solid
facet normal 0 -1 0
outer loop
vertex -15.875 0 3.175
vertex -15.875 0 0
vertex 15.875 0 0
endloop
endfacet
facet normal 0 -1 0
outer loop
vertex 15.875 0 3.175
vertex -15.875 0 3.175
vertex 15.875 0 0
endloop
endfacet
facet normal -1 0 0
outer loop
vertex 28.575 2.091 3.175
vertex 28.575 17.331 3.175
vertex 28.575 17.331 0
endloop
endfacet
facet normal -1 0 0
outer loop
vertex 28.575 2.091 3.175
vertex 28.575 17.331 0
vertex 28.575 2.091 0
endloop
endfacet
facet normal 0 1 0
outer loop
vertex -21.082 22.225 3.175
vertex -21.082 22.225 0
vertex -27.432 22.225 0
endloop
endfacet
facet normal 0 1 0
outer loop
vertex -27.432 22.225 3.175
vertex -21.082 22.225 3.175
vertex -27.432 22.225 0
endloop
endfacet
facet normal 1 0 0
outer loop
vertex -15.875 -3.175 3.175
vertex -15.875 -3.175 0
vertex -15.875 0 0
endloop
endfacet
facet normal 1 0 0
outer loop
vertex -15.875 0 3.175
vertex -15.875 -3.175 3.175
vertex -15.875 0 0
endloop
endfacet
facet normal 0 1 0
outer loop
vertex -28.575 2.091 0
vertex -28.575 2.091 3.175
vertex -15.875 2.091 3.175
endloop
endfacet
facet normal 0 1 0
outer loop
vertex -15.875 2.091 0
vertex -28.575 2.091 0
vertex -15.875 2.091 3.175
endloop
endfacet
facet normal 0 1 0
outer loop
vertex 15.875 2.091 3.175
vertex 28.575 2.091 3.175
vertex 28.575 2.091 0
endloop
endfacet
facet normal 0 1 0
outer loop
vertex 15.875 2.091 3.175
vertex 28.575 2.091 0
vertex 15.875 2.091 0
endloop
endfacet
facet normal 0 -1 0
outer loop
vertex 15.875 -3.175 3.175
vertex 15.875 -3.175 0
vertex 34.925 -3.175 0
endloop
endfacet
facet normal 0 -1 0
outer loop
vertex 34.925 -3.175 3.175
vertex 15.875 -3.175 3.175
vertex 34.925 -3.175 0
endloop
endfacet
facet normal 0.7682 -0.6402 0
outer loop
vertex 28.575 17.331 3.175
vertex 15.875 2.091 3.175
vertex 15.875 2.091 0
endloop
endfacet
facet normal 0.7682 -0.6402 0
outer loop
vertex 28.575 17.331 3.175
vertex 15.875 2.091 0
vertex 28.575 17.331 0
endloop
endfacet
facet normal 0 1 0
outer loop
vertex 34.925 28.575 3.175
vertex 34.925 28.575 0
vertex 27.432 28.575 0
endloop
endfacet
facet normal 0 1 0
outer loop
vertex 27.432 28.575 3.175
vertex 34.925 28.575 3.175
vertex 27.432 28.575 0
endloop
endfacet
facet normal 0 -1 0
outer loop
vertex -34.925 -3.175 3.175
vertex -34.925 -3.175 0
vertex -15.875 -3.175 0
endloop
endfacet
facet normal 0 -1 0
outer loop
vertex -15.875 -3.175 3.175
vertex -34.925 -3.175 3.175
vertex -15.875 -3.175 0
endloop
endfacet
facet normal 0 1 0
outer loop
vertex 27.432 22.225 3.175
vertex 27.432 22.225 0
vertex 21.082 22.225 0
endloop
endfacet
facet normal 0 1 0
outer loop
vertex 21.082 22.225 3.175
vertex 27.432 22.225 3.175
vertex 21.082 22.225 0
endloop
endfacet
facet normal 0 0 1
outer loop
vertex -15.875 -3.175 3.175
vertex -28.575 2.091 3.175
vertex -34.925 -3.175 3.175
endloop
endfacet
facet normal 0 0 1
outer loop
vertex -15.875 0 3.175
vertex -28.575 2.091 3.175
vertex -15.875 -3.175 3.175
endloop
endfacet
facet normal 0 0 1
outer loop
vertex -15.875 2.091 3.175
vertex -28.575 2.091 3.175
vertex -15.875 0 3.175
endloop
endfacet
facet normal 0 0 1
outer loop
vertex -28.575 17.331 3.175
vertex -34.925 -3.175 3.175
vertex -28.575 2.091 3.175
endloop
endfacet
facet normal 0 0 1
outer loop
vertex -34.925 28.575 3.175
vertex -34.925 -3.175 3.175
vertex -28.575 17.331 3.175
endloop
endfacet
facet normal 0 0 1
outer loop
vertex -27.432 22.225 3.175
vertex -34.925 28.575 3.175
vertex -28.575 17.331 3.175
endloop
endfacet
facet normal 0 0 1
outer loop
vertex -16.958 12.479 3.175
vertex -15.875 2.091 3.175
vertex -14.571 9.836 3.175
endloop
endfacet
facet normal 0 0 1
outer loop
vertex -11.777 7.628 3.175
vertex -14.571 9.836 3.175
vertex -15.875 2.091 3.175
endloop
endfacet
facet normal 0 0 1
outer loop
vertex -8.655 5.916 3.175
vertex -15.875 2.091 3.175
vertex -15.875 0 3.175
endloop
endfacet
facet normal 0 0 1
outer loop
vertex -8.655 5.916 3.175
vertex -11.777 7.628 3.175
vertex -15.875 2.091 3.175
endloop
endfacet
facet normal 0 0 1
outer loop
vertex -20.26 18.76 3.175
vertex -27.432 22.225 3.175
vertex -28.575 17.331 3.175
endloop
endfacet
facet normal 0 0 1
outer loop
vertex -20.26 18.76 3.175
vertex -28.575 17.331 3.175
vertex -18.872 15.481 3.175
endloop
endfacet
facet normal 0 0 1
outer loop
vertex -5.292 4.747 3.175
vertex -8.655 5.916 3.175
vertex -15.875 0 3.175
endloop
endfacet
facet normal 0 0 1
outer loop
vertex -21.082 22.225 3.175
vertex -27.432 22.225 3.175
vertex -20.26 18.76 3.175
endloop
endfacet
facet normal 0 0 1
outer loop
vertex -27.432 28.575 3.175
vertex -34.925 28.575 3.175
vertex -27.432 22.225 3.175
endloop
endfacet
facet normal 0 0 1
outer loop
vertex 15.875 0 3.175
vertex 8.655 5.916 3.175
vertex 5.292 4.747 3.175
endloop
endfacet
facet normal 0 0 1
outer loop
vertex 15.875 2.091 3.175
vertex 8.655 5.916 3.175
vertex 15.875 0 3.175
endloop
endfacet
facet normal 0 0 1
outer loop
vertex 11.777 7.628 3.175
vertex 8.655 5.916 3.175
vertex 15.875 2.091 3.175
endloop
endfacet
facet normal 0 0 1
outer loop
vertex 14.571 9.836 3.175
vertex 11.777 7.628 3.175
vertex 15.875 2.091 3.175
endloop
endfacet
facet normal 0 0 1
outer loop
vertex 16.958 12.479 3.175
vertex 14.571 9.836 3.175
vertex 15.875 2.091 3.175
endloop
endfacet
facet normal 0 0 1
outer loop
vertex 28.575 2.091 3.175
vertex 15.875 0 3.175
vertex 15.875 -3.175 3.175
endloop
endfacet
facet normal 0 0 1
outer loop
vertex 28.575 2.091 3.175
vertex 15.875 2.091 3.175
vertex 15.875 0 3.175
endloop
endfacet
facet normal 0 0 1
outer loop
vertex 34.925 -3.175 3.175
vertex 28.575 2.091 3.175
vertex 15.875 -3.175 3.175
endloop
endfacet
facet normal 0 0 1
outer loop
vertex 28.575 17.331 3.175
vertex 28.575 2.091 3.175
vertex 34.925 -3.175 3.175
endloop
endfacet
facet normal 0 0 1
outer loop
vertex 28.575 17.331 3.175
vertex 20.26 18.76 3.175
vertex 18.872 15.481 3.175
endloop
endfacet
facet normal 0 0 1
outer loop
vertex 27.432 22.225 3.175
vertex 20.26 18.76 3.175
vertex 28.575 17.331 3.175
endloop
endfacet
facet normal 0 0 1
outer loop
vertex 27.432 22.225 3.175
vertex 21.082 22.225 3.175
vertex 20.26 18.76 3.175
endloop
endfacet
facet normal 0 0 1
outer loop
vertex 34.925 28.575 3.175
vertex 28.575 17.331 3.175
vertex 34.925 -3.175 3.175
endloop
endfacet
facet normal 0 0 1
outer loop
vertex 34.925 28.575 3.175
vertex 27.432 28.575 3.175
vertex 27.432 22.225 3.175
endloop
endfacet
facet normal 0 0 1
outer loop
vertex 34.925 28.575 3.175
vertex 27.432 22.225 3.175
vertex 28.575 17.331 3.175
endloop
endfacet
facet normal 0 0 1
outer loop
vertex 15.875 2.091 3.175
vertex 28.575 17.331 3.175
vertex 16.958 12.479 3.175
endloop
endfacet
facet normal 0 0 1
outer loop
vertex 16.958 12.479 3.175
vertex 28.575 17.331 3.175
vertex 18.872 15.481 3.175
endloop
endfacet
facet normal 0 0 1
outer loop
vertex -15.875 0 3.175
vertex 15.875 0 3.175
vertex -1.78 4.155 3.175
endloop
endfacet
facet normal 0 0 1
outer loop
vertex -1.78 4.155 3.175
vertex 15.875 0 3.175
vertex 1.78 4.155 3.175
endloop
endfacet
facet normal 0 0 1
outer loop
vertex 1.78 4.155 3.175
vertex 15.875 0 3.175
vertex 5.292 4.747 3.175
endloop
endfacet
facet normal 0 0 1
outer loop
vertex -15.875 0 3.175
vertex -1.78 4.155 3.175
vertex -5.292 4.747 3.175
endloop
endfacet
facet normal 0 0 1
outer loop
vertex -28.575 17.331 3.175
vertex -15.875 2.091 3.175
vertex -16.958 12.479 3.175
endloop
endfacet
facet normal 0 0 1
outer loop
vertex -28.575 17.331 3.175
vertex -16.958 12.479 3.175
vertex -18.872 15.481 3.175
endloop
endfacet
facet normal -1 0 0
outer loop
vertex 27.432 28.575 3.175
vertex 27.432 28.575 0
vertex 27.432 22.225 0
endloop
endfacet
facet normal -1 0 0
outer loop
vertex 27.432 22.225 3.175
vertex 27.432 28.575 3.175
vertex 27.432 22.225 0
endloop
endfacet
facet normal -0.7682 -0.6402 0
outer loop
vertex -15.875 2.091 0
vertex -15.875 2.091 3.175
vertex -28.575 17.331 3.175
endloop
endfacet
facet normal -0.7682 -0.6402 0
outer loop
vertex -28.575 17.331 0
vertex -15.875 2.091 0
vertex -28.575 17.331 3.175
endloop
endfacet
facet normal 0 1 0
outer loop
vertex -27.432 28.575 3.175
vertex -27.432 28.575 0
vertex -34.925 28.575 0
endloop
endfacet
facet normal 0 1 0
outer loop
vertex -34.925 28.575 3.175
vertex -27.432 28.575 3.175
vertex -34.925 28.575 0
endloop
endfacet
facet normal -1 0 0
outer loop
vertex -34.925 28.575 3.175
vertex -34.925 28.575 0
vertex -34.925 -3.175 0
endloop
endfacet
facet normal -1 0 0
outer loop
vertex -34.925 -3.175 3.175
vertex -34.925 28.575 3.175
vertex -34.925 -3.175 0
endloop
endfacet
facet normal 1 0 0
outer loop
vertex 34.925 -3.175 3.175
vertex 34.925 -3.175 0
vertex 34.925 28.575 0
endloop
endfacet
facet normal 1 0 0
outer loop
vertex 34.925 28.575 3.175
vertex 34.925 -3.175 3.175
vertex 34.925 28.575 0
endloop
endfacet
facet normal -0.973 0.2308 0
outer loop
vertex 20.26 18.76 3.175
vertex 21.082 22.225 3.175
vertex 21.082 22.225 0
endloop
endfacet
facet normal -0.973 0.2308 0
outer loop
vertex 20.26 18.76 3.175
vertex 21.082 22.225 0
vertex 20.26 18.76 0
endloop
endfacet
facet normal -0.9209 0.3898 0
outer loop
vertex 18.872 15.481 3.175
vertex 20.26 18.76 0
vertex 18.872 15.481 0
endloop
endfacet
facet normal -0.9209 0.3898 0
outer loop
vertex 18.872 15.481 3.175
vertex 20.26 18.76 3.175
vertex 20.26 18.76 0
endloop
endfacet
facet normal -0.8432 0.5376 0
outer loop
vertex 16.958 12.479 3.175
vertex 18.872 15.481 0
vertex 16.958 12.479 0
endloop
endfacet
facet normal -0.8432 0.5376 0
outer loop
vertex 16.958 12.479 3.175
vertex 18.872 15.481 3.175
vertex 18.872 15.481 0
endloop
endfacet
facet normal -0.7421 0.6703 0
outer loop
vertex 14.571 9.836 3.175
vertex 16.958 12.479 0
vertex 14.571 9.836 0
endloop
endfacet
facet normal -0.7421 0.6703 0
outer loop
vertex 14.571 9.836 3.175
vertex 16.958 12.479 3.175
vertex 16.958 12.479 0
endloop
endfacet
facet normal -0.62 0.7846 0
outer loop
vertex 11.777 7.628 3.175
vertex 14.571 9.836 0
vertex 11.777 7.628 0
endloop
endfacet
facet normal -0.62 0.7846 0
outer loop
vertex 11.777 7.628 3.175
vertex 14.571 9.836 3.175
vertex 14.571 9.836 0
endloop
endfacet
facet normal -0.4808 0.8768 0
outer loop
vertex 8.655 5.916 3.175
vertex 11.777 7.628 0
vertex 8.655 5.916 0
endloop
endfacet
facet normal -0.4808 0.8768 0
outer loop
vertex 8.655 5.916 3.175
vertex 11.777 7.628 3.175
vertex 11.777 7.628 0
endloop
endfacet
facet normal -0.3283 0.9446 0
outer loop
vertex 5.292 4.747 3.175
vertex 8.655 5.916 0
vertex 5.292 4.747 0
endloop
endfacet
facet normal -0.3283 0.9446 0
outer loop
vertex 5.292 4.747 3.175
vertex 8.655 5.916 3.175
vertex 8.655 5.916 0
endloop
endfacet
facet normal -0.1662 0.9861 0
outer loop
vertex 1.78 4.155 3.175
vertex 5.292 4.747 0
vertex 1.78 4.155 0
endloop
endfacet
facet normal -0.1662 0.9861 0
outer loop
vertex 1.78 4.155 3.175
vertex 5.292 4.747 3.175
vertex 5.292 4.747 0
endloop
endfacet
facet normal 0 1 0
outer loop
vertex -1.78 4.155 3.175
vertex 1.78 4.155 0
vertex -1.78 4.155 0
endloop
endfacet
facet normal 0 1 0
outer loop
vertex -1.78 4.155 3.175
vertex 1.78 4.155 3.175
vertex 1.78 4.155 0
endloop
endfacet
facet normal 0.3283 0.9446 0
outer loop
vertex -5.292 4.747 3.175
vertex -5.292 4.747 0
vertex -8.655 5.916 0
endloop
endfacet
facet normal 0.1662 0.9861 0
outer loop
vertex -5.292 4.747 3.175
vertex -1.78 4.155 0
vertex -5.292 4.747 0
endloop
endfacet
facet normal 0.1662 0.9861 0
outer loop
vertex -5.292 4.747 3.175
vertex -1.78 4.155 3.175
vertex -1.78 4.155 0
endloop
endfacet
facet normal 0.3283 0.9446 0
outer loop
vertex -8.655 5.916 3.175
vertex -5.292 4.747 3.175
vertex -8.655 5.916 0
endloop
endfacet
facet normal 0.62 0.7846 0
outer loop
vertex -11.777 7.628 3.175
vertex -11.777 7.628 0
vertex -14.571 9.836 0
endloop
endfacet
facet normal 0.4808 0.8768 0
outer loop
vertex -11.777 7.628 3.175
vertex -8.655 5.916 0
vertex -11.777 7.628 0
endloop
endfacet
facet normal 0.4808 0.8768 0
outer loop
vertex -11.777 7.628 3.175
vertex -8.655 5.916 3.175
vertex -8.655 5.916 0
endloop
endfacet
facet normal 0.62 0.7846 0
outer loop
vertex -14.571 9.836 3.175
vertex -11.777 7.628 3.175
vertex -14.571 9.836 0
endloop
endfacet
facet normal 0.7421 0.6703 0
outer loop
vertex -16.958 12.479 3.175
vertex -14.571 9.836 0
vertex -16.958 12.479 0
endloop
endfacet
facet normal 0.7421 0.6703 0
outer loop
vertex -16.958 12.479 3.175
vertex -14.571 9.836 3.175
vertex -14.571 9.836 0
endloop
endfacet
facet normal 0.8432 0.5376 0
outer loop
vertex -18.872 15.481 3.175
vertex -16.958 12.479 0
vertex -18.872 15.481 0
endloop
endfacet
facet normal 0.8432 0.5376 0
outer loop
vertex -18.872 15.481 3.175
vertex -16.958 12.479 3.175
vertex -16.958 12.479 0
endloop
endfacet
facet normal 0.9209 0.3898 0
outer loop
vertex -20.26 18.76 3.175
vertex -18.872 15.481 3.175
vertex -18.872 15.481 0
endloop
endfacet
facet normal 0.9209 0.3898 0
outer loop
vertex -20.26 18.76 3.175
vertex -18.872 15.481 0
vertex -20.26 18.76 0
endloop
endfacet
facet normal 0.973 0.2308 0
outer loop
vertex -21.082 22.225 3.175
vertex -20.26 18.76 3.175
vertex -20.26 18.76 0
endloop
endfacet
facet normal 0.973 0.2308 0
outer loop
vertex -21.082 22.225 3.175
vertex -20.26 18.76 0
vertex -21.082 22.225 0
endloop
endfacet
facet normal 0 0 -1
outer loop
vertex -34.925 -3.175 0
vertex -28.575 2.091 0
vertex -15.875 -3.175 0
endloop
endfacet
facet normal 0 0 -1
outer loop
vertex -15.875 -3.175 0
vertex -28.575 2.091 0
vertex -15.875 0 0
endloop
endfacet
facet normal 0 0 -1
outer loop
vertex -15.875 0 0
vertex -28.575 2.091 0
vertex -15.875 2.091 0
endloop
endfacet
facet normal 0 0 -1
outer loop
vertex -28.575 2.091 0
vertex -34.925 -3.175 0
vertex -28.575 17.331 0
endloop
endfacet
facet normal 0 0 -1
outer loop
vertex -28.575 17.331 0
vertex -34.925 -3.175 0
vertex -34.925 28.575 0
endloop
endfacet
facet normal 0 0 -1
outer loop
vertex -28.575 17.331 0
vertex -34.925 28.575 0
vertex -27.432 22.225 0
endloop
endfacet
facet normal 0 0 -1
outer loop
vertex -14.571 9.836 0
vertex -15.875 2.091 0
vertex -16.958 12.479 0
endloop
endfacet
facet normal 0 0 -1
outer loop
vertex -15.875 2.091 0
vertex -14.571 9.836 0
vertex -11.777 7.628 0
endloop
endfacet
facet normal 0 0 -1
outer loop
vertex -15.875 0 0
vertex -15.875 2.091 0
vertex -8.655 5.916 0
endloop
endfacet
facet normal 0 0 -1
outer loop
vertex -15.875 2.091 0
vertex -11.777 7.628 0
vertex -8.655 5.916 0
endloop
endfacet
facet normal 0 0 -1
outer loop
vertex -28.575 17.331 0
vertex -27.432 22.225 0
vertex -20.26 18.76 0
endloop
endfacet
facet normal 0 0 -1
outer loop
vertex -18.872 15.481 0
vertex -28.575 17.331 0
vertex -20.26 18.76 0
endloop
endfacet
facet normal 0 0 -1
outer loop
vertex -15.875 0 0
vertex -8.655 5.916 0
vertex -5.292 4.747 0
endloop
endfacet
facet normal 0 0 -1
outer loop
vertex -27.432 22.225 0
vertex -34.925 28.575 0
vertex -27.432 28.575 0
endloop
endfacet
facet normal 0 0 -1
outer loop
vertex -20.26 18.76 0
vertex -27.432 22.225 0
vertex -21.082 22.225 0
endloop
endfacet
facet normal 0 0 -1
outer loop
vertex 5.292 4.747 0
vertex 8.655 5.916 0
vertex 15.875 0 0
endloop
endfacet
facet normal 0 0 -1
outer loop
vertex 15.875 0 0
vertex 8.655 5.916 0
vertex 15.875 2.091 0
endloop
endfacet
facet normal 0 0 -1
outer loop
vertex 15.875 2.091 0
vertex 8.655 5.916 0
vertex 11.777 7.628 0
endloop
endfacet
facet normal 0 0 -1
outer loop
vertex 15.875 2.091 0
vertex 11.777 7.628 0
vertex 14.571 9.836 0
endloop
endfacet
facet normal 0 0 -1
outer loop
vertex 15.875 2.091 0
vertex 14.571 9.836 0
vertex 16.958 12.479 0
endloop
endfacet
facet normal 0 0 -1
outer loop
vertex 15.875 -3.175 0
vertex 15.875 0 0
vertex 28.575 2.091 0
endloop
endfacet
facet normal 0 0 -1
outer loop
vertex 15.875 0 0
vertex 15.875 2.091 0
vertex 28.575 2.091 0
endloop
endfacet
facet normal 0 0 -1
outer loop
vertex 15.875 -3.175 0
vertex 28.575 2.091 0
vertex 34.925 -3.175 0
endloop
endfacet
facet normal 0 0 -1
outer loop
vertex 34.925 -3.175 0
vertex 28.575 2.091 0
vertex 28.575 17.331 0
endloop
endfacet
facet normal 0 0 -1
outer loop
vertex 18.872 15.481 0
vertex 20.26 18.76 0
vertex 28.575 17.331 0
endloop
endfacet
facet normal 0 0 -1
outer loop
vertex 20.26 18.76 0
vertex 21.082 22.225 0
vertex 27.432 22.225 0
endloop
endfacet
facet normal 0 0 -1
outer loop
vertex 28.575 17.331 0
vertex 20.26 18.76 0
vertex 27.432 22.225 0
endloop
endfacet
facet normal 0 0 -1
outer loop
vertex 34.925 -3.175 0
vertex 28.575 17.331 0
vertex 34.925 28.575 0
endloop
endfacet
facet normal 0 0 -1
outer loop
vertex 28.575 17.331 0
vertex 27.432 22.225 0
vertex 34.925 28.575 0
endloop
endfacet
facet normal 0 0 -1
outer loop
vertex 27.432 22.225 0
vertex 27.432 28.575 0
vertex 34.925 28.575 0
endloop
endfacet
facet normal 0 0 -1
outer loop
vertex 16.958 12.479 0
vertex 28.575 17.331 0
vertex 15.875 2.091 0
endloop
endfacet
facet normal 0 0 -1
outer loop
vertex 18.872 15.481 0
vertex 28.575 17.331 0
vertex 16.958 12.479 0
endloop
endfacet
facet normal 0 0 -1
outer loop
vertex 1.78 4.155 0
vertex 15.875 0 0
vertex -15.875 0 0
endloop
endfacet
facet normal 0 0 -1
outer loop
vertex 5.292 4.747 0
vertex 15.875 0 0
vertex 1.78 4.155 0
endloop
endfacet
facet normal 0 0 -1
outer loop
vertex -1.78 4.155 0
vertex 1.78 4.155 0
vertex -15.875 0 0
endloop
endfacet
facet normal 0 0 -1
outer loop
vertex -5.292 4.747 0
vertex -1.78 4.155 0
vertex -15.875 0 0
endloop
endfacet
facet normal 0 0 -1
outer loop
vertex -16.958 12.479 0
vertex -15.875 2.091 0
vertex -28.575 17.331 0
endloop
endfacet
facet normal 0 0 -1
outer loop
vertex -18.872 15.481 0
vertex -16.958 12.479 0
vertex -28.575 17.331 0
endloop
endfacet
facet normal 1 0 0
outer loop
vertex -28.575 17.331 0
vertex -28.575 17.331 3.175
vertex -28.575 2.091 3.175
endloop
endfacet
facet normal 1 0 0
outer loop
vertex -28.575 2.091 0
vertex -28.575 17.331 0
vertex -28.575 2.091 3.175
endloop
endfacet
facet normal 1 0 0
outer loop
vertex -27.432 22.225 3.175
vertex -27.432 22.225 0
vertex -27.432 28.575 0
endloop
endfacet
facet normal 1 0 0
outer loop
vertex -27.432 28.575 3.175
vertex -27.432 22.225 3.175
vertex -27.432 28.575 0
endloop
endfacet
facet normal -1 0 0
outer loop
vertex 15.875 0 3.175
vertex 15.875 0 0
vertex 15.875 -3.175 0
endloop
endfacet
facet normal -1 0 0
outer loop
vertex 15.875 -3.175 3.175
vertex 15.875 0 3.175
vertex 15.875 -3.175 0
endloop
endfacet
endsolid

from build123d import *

# Parameters (mm, degrees)
BOSS_EXTRUDE1_DEPTH = 3.175
CUT_EXTRUDE1_DEPTH  = 46.236786745


with BuildPart() as part:
    # Sketch1 → Boss-Extrude1 (new body)
    with BuildSketch(Plane.XY):
        Polygon((-34.925, 28.575), (-34.925, -3.175), (-15.875, -3.175), (-15.875, 0), (15.875, 0), (15.875, -3.175), (34.925, -3.175), (34.925, 28.575), (27.432, 28.575), (27.432, 22.225), (-27.432, 22.225), (-27.432, 28.575), align=None)
    extrude(amount=BOSS_EXTRUDE1_DEPTH)

    # Sketch2 → Cut-Extrude1 (cut, through all)
    with BuildSketch(Plane.XY.offset(3.175)):
        with BuildLine():
            Line((-21.082, 22.225), (21.082, 22.225))
            ThreePointArc((21.082, 22.225), (0, 4.080259171), (-21.082, 22.225))
        make_face()
        Polygon((-28.575, 17.330749155), (-28.575, 2.090749155), (-15.875, 2.090749155), align=None)
        Polygon((28.575, 2.090749155), (15.875, 2.090749155), (28.575, 17.330749155), align=None)
    extrude(amount=-CUT_EXTRUDE1_DEPTH, mode=Mode.SUBTRACT)


solid = part.part
